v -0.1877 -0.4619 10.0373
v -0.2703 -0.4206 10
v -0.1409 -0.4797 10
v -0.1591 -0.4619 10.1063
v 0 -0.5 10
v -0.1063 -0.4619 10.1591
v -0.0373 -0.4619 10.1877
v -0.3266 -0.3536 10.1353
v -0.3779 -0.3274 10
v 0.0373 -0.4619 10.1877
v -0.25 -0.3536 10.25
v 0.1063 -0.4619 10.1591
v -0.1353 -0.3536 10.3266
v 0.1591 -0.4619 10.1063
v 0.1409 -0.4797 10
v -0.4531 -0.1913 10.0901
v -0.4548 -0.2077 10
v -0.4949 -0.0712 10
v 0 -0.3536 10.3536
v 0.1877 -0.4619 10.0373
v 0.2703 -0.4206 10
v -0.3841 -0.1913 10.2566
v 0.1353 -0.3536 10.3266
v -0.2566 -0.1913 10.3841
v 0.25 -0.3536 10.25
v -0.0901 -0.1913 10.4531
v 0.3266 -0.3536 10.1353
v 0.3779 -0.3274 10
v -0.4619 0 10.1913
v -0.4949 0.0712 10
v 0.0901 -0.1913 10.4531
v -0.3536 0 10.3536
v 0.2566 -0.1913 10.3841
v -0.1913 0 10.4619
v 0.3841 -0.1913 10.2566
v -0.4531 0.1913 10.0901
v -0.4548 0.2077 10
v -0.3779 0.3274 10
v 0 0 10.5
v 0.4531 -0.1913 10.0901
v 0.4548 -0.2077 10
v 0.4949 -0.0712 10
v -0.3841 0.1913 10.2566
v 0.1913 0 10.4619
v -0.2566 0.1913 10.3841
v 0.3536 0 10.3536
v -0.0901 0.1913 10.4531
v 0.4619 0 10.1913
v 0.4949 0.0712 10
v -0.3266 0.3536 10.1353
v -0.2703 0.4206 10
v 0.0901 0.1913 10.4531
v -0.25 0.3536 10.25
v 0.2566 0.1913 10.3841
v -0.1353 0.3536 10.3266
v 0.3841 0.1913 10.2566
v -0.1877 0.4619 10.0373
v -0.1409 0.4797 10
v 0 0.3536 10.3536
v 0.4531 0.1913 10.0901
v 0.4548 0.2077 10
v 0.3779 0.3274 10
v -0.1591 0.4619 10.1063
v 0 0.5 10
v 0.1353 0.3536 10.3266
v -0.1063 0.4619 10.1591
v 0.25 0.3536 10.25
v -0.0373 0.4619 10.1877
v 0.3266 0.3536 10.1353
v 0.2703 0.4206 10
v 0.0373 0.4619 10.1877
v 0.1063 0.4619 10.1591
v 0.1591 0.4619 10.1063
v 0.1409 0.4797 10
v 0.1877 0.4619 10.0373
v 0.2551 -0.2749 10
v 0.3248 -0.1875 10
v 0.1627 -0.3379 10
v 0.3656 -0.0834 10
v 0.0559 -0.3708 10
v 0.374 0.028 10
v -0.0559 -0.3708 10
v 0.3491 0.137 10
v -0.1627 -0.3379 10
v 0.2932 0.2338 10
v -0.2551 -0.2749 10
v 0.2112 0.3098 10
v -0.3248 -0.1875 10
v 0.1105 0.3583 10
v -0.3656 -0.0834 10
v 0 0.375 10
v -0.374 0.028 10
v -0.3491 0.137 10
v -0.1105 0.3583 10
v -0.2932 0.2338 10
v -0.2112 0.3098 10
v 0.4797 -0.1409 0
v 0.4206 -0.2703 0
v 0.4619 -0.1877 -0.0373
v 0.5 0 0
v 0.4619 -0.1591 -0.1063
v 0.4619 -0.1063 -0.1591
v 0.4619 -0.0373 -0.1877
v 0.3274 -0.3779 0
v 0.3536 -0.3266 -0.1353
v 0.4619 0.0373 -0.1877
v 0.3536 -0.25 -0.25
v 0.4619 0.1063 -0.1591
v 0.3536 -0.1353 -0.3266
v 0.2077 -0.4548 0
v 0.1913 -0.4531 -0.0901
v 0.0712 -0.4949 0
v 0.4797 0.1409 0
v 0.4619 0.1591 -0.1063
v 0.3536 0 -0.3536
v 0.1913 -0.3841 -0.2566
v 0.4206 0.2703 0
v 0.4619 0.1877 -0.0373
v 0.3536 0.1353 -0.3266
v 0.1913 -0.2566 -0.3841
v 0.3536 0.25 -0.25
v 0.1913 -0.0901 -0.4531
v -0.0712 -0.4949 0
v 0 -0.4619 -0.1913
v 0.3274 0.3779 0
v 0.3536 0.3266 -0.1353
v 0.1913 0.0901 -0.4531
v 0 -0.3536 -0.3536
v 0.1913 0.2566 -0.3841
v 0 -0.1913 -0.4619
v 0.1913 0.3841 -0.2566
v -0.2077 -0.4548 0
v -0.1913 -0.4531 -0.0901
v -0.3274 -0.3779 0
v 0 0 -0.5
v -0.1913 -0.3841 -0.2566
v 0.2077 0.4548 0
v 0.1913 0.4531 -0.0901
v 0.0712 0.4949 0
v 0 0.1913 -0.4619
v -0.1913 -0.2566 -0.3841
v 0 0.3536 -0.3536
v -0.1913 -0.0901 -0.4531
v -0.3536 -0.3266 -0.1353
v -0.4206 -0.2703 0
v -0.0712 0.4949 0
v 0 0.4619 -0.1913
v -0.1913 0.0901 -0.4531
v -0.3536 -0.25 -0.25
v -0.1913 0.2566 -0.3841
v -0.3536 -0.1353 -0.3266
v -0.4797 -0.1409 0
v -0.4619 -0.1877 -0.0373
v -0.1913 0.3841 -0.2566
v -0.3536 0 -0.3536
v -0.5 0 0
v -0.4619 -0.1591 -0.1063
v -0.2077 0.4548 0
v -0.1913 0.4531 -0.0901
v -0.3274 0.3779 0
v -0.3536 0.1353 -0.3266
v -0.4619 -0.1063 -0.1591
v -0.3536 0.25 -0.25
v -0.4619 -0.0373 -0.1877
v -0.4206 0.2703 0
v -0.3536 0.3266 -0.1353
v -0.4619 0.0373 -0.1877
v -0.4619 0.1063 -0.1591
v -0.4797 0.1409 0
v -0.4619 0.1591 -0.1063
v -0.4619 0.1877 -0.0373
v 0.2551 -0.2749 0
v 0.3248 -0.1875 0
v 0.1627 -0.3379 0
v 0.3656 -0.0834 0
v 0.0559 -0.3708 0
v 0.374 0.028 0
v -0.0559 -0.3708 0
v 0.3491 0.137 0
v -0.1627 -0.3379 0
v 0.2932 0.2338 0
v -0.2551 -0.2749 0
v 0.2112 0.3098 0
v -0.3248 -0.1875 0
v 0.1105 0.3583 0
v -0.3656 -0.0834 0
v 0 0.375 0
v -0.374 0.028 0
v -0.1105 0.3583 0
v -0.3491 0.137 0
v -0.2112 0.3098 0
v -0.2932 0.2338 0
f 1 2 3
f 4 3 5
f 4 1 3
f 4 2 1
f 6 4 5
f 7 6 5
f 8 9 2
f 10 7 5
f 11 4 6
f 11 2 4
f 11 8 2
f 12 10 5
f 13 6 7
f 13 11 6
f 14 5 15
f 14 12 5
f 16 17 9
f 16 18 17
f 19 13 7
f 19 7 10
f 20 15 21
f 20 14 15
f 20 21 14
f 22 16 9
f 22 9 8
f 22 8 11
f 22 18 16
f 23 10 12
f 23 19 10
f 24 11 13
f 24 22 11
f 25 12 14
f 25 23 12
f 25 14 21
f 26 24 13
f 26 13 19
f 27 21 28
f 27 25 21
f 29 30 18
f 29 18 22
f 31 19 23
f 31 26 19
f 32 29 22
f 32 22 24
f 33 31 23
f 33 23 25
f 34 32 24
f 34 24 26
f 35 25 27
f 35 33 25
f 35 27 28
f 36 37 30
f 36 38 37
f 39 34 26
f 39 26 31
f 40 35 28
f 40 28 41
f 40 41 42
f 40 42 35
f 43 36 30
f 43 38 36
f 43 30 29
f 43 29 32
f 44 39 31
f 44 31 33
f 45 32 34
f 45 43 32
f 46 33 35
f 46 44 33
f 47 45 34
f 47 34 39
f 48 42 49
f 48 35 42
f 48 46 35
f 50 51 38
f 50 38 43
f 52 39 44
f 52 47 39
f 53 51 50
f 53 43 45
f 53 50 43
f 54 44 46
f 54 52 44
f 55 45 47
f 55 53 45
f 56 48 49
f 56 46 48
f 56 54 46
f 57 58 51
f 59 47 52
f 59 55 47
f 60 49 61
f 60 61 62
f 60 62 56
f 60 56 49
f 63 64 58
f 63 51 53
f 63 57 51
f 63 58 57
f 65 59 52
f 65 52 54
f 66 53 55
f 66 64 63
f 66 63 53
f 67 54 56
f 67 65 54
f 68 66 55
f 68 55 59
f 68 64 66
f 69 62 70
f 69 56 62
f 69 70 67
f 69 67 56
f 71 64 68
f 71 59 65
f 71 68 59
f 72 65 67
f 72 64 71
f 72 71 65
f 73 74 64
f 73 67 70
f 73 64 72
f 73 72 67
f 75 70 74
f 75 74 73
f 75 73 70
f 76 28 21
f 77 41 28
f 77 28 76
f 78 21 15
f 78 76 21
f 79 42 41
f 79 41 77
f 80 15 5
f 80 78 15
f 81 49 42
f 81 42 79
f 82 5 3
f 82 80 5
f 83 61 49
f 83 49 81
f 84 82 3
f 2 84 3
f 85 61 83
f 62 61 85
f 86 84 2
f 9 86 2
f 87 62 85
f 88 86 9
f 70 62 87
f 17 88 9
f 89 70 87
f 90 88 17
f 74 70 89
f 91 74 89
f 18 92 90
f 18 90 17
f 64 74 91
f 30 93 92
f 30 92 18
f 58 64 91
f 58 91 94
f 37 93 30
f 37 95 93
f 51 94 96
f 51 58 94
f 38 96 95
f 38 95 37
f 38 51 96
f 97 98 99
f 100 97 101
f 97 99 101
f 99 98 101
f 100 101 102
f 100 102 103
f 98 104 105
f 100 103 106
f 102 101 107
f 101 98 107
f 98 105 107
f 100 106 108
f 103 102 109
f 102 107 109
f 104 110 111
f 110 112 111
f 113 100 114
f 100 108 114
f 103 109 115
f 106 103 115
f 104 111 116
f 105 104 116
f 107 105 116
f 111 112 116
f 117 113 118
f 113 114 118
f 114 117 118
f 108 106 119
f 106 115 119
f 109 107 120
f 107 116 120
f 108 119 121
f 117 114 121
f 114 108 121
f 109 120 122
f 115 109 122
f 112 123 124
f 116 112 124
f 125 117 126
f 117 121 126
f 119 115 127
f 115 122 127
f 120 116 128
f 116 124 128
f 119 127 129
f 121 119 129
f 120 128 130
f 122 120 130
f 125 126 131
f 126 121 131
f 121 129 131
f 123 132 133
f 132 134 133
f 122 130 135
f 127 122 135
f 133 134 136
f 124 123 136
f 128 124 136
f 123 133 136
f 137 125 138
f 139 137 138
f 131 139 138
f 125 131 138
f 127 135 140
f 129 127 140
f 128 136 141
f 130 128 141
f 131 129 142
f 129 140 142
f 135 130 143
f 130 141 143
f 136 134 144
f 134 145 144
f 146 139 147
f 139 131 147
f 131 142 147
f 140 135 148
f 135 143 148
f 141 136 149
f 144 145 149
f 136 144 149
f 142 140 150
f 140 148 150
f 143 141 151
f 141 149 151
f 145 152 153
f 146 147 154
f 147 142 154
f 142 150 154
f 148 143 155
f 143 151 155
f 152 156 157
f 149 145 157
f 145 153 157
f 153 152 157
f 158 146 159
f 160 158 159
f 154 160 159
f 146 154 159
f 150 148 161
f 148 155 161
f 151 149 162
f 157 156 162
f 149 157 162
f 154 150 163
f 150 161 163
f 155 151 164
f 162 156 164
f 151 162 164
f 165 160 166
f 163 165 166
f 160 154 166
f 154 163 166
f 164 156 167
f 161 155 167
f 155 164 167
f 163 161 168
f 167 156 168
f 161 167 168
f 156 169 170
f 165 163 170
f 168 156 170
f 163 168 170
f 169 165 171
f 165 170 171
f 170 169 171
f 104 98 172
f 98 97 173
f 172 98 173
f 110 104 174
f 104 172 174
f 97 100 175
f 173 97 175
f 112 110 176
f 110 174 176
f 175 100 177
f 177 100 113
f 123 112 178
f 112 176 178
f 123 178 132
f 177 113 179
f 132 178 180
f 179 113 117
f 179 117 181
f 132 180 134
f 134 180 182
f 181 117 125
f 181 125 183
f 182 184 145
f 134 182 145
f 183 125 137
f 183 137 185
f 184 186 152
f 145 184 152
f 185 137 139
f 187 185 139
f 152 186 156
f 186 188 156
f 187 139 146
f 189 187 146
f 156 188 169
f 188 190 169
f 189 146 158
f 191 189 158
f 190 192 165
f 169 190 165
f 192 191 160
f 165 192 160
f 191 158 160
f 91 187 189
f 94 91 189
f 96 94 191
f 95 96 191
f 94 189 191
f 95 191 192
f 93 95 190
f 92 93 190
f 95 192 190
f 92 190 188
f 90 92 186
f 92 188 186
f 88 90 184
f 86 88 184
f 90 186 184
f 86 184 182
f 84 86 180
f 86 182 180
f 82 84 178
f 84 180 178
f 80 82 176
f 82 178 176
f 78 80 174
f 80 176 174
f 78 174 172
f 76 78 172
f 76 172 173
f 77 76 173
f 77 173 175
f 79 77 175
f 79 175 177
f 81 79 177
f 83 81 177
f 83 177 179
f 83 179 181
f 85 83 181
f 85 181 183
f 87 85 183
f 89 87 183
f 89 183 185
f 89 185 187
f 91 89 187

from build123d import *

# Parameters (mm, degrees)
REVOLVE_1_ANGLE = 180
SKETCH_2_R      = 0.375
EXTRUDE_1_DEPTH = 10
REVOLVE_2_ANGLE = 180


with BuildPart() as part:
    # 草图1 → 旋转1 (revolve)
    with BuildSketch(Plane.XY):
        with BuildLine():
            Line((-0.5, 0), (0.5, 0))
            ThreePointArc((0.5, 0), (0, -0.5), (-0.5, 0))
        make_face()
    revolve(axis=Axis((-0.5, 0, 0), (1, 0, 0)), revolution_arc=REVOLVE_1_ANGLE)

    # 草图2 → 凸台-拉伸1 (add)
    with BuildSketch(Plane.XY):
        with Locations(Location((0, 0, 0), (0, 0, 90))):
            Circle(SKETCH_2_R)
    extrude(amount=EXTRUDE_1_DEPTH)

    # 草图3 → 旋转2 (revolve)
    with BuildSketch(Plane.XY.offset(10)):
        with BuildLine():
            Line((0, 0.5), (0, -0.5))
            ThreePointArc((0, -0.5), (-0.5, 0), (0, 0.5))
        make_face()
    revolve(axis=Axis((0, 0.5, 10), (0, 1, 0)), revolution_arc=REVOLVE_2_ANGLE)


solid = part.part
